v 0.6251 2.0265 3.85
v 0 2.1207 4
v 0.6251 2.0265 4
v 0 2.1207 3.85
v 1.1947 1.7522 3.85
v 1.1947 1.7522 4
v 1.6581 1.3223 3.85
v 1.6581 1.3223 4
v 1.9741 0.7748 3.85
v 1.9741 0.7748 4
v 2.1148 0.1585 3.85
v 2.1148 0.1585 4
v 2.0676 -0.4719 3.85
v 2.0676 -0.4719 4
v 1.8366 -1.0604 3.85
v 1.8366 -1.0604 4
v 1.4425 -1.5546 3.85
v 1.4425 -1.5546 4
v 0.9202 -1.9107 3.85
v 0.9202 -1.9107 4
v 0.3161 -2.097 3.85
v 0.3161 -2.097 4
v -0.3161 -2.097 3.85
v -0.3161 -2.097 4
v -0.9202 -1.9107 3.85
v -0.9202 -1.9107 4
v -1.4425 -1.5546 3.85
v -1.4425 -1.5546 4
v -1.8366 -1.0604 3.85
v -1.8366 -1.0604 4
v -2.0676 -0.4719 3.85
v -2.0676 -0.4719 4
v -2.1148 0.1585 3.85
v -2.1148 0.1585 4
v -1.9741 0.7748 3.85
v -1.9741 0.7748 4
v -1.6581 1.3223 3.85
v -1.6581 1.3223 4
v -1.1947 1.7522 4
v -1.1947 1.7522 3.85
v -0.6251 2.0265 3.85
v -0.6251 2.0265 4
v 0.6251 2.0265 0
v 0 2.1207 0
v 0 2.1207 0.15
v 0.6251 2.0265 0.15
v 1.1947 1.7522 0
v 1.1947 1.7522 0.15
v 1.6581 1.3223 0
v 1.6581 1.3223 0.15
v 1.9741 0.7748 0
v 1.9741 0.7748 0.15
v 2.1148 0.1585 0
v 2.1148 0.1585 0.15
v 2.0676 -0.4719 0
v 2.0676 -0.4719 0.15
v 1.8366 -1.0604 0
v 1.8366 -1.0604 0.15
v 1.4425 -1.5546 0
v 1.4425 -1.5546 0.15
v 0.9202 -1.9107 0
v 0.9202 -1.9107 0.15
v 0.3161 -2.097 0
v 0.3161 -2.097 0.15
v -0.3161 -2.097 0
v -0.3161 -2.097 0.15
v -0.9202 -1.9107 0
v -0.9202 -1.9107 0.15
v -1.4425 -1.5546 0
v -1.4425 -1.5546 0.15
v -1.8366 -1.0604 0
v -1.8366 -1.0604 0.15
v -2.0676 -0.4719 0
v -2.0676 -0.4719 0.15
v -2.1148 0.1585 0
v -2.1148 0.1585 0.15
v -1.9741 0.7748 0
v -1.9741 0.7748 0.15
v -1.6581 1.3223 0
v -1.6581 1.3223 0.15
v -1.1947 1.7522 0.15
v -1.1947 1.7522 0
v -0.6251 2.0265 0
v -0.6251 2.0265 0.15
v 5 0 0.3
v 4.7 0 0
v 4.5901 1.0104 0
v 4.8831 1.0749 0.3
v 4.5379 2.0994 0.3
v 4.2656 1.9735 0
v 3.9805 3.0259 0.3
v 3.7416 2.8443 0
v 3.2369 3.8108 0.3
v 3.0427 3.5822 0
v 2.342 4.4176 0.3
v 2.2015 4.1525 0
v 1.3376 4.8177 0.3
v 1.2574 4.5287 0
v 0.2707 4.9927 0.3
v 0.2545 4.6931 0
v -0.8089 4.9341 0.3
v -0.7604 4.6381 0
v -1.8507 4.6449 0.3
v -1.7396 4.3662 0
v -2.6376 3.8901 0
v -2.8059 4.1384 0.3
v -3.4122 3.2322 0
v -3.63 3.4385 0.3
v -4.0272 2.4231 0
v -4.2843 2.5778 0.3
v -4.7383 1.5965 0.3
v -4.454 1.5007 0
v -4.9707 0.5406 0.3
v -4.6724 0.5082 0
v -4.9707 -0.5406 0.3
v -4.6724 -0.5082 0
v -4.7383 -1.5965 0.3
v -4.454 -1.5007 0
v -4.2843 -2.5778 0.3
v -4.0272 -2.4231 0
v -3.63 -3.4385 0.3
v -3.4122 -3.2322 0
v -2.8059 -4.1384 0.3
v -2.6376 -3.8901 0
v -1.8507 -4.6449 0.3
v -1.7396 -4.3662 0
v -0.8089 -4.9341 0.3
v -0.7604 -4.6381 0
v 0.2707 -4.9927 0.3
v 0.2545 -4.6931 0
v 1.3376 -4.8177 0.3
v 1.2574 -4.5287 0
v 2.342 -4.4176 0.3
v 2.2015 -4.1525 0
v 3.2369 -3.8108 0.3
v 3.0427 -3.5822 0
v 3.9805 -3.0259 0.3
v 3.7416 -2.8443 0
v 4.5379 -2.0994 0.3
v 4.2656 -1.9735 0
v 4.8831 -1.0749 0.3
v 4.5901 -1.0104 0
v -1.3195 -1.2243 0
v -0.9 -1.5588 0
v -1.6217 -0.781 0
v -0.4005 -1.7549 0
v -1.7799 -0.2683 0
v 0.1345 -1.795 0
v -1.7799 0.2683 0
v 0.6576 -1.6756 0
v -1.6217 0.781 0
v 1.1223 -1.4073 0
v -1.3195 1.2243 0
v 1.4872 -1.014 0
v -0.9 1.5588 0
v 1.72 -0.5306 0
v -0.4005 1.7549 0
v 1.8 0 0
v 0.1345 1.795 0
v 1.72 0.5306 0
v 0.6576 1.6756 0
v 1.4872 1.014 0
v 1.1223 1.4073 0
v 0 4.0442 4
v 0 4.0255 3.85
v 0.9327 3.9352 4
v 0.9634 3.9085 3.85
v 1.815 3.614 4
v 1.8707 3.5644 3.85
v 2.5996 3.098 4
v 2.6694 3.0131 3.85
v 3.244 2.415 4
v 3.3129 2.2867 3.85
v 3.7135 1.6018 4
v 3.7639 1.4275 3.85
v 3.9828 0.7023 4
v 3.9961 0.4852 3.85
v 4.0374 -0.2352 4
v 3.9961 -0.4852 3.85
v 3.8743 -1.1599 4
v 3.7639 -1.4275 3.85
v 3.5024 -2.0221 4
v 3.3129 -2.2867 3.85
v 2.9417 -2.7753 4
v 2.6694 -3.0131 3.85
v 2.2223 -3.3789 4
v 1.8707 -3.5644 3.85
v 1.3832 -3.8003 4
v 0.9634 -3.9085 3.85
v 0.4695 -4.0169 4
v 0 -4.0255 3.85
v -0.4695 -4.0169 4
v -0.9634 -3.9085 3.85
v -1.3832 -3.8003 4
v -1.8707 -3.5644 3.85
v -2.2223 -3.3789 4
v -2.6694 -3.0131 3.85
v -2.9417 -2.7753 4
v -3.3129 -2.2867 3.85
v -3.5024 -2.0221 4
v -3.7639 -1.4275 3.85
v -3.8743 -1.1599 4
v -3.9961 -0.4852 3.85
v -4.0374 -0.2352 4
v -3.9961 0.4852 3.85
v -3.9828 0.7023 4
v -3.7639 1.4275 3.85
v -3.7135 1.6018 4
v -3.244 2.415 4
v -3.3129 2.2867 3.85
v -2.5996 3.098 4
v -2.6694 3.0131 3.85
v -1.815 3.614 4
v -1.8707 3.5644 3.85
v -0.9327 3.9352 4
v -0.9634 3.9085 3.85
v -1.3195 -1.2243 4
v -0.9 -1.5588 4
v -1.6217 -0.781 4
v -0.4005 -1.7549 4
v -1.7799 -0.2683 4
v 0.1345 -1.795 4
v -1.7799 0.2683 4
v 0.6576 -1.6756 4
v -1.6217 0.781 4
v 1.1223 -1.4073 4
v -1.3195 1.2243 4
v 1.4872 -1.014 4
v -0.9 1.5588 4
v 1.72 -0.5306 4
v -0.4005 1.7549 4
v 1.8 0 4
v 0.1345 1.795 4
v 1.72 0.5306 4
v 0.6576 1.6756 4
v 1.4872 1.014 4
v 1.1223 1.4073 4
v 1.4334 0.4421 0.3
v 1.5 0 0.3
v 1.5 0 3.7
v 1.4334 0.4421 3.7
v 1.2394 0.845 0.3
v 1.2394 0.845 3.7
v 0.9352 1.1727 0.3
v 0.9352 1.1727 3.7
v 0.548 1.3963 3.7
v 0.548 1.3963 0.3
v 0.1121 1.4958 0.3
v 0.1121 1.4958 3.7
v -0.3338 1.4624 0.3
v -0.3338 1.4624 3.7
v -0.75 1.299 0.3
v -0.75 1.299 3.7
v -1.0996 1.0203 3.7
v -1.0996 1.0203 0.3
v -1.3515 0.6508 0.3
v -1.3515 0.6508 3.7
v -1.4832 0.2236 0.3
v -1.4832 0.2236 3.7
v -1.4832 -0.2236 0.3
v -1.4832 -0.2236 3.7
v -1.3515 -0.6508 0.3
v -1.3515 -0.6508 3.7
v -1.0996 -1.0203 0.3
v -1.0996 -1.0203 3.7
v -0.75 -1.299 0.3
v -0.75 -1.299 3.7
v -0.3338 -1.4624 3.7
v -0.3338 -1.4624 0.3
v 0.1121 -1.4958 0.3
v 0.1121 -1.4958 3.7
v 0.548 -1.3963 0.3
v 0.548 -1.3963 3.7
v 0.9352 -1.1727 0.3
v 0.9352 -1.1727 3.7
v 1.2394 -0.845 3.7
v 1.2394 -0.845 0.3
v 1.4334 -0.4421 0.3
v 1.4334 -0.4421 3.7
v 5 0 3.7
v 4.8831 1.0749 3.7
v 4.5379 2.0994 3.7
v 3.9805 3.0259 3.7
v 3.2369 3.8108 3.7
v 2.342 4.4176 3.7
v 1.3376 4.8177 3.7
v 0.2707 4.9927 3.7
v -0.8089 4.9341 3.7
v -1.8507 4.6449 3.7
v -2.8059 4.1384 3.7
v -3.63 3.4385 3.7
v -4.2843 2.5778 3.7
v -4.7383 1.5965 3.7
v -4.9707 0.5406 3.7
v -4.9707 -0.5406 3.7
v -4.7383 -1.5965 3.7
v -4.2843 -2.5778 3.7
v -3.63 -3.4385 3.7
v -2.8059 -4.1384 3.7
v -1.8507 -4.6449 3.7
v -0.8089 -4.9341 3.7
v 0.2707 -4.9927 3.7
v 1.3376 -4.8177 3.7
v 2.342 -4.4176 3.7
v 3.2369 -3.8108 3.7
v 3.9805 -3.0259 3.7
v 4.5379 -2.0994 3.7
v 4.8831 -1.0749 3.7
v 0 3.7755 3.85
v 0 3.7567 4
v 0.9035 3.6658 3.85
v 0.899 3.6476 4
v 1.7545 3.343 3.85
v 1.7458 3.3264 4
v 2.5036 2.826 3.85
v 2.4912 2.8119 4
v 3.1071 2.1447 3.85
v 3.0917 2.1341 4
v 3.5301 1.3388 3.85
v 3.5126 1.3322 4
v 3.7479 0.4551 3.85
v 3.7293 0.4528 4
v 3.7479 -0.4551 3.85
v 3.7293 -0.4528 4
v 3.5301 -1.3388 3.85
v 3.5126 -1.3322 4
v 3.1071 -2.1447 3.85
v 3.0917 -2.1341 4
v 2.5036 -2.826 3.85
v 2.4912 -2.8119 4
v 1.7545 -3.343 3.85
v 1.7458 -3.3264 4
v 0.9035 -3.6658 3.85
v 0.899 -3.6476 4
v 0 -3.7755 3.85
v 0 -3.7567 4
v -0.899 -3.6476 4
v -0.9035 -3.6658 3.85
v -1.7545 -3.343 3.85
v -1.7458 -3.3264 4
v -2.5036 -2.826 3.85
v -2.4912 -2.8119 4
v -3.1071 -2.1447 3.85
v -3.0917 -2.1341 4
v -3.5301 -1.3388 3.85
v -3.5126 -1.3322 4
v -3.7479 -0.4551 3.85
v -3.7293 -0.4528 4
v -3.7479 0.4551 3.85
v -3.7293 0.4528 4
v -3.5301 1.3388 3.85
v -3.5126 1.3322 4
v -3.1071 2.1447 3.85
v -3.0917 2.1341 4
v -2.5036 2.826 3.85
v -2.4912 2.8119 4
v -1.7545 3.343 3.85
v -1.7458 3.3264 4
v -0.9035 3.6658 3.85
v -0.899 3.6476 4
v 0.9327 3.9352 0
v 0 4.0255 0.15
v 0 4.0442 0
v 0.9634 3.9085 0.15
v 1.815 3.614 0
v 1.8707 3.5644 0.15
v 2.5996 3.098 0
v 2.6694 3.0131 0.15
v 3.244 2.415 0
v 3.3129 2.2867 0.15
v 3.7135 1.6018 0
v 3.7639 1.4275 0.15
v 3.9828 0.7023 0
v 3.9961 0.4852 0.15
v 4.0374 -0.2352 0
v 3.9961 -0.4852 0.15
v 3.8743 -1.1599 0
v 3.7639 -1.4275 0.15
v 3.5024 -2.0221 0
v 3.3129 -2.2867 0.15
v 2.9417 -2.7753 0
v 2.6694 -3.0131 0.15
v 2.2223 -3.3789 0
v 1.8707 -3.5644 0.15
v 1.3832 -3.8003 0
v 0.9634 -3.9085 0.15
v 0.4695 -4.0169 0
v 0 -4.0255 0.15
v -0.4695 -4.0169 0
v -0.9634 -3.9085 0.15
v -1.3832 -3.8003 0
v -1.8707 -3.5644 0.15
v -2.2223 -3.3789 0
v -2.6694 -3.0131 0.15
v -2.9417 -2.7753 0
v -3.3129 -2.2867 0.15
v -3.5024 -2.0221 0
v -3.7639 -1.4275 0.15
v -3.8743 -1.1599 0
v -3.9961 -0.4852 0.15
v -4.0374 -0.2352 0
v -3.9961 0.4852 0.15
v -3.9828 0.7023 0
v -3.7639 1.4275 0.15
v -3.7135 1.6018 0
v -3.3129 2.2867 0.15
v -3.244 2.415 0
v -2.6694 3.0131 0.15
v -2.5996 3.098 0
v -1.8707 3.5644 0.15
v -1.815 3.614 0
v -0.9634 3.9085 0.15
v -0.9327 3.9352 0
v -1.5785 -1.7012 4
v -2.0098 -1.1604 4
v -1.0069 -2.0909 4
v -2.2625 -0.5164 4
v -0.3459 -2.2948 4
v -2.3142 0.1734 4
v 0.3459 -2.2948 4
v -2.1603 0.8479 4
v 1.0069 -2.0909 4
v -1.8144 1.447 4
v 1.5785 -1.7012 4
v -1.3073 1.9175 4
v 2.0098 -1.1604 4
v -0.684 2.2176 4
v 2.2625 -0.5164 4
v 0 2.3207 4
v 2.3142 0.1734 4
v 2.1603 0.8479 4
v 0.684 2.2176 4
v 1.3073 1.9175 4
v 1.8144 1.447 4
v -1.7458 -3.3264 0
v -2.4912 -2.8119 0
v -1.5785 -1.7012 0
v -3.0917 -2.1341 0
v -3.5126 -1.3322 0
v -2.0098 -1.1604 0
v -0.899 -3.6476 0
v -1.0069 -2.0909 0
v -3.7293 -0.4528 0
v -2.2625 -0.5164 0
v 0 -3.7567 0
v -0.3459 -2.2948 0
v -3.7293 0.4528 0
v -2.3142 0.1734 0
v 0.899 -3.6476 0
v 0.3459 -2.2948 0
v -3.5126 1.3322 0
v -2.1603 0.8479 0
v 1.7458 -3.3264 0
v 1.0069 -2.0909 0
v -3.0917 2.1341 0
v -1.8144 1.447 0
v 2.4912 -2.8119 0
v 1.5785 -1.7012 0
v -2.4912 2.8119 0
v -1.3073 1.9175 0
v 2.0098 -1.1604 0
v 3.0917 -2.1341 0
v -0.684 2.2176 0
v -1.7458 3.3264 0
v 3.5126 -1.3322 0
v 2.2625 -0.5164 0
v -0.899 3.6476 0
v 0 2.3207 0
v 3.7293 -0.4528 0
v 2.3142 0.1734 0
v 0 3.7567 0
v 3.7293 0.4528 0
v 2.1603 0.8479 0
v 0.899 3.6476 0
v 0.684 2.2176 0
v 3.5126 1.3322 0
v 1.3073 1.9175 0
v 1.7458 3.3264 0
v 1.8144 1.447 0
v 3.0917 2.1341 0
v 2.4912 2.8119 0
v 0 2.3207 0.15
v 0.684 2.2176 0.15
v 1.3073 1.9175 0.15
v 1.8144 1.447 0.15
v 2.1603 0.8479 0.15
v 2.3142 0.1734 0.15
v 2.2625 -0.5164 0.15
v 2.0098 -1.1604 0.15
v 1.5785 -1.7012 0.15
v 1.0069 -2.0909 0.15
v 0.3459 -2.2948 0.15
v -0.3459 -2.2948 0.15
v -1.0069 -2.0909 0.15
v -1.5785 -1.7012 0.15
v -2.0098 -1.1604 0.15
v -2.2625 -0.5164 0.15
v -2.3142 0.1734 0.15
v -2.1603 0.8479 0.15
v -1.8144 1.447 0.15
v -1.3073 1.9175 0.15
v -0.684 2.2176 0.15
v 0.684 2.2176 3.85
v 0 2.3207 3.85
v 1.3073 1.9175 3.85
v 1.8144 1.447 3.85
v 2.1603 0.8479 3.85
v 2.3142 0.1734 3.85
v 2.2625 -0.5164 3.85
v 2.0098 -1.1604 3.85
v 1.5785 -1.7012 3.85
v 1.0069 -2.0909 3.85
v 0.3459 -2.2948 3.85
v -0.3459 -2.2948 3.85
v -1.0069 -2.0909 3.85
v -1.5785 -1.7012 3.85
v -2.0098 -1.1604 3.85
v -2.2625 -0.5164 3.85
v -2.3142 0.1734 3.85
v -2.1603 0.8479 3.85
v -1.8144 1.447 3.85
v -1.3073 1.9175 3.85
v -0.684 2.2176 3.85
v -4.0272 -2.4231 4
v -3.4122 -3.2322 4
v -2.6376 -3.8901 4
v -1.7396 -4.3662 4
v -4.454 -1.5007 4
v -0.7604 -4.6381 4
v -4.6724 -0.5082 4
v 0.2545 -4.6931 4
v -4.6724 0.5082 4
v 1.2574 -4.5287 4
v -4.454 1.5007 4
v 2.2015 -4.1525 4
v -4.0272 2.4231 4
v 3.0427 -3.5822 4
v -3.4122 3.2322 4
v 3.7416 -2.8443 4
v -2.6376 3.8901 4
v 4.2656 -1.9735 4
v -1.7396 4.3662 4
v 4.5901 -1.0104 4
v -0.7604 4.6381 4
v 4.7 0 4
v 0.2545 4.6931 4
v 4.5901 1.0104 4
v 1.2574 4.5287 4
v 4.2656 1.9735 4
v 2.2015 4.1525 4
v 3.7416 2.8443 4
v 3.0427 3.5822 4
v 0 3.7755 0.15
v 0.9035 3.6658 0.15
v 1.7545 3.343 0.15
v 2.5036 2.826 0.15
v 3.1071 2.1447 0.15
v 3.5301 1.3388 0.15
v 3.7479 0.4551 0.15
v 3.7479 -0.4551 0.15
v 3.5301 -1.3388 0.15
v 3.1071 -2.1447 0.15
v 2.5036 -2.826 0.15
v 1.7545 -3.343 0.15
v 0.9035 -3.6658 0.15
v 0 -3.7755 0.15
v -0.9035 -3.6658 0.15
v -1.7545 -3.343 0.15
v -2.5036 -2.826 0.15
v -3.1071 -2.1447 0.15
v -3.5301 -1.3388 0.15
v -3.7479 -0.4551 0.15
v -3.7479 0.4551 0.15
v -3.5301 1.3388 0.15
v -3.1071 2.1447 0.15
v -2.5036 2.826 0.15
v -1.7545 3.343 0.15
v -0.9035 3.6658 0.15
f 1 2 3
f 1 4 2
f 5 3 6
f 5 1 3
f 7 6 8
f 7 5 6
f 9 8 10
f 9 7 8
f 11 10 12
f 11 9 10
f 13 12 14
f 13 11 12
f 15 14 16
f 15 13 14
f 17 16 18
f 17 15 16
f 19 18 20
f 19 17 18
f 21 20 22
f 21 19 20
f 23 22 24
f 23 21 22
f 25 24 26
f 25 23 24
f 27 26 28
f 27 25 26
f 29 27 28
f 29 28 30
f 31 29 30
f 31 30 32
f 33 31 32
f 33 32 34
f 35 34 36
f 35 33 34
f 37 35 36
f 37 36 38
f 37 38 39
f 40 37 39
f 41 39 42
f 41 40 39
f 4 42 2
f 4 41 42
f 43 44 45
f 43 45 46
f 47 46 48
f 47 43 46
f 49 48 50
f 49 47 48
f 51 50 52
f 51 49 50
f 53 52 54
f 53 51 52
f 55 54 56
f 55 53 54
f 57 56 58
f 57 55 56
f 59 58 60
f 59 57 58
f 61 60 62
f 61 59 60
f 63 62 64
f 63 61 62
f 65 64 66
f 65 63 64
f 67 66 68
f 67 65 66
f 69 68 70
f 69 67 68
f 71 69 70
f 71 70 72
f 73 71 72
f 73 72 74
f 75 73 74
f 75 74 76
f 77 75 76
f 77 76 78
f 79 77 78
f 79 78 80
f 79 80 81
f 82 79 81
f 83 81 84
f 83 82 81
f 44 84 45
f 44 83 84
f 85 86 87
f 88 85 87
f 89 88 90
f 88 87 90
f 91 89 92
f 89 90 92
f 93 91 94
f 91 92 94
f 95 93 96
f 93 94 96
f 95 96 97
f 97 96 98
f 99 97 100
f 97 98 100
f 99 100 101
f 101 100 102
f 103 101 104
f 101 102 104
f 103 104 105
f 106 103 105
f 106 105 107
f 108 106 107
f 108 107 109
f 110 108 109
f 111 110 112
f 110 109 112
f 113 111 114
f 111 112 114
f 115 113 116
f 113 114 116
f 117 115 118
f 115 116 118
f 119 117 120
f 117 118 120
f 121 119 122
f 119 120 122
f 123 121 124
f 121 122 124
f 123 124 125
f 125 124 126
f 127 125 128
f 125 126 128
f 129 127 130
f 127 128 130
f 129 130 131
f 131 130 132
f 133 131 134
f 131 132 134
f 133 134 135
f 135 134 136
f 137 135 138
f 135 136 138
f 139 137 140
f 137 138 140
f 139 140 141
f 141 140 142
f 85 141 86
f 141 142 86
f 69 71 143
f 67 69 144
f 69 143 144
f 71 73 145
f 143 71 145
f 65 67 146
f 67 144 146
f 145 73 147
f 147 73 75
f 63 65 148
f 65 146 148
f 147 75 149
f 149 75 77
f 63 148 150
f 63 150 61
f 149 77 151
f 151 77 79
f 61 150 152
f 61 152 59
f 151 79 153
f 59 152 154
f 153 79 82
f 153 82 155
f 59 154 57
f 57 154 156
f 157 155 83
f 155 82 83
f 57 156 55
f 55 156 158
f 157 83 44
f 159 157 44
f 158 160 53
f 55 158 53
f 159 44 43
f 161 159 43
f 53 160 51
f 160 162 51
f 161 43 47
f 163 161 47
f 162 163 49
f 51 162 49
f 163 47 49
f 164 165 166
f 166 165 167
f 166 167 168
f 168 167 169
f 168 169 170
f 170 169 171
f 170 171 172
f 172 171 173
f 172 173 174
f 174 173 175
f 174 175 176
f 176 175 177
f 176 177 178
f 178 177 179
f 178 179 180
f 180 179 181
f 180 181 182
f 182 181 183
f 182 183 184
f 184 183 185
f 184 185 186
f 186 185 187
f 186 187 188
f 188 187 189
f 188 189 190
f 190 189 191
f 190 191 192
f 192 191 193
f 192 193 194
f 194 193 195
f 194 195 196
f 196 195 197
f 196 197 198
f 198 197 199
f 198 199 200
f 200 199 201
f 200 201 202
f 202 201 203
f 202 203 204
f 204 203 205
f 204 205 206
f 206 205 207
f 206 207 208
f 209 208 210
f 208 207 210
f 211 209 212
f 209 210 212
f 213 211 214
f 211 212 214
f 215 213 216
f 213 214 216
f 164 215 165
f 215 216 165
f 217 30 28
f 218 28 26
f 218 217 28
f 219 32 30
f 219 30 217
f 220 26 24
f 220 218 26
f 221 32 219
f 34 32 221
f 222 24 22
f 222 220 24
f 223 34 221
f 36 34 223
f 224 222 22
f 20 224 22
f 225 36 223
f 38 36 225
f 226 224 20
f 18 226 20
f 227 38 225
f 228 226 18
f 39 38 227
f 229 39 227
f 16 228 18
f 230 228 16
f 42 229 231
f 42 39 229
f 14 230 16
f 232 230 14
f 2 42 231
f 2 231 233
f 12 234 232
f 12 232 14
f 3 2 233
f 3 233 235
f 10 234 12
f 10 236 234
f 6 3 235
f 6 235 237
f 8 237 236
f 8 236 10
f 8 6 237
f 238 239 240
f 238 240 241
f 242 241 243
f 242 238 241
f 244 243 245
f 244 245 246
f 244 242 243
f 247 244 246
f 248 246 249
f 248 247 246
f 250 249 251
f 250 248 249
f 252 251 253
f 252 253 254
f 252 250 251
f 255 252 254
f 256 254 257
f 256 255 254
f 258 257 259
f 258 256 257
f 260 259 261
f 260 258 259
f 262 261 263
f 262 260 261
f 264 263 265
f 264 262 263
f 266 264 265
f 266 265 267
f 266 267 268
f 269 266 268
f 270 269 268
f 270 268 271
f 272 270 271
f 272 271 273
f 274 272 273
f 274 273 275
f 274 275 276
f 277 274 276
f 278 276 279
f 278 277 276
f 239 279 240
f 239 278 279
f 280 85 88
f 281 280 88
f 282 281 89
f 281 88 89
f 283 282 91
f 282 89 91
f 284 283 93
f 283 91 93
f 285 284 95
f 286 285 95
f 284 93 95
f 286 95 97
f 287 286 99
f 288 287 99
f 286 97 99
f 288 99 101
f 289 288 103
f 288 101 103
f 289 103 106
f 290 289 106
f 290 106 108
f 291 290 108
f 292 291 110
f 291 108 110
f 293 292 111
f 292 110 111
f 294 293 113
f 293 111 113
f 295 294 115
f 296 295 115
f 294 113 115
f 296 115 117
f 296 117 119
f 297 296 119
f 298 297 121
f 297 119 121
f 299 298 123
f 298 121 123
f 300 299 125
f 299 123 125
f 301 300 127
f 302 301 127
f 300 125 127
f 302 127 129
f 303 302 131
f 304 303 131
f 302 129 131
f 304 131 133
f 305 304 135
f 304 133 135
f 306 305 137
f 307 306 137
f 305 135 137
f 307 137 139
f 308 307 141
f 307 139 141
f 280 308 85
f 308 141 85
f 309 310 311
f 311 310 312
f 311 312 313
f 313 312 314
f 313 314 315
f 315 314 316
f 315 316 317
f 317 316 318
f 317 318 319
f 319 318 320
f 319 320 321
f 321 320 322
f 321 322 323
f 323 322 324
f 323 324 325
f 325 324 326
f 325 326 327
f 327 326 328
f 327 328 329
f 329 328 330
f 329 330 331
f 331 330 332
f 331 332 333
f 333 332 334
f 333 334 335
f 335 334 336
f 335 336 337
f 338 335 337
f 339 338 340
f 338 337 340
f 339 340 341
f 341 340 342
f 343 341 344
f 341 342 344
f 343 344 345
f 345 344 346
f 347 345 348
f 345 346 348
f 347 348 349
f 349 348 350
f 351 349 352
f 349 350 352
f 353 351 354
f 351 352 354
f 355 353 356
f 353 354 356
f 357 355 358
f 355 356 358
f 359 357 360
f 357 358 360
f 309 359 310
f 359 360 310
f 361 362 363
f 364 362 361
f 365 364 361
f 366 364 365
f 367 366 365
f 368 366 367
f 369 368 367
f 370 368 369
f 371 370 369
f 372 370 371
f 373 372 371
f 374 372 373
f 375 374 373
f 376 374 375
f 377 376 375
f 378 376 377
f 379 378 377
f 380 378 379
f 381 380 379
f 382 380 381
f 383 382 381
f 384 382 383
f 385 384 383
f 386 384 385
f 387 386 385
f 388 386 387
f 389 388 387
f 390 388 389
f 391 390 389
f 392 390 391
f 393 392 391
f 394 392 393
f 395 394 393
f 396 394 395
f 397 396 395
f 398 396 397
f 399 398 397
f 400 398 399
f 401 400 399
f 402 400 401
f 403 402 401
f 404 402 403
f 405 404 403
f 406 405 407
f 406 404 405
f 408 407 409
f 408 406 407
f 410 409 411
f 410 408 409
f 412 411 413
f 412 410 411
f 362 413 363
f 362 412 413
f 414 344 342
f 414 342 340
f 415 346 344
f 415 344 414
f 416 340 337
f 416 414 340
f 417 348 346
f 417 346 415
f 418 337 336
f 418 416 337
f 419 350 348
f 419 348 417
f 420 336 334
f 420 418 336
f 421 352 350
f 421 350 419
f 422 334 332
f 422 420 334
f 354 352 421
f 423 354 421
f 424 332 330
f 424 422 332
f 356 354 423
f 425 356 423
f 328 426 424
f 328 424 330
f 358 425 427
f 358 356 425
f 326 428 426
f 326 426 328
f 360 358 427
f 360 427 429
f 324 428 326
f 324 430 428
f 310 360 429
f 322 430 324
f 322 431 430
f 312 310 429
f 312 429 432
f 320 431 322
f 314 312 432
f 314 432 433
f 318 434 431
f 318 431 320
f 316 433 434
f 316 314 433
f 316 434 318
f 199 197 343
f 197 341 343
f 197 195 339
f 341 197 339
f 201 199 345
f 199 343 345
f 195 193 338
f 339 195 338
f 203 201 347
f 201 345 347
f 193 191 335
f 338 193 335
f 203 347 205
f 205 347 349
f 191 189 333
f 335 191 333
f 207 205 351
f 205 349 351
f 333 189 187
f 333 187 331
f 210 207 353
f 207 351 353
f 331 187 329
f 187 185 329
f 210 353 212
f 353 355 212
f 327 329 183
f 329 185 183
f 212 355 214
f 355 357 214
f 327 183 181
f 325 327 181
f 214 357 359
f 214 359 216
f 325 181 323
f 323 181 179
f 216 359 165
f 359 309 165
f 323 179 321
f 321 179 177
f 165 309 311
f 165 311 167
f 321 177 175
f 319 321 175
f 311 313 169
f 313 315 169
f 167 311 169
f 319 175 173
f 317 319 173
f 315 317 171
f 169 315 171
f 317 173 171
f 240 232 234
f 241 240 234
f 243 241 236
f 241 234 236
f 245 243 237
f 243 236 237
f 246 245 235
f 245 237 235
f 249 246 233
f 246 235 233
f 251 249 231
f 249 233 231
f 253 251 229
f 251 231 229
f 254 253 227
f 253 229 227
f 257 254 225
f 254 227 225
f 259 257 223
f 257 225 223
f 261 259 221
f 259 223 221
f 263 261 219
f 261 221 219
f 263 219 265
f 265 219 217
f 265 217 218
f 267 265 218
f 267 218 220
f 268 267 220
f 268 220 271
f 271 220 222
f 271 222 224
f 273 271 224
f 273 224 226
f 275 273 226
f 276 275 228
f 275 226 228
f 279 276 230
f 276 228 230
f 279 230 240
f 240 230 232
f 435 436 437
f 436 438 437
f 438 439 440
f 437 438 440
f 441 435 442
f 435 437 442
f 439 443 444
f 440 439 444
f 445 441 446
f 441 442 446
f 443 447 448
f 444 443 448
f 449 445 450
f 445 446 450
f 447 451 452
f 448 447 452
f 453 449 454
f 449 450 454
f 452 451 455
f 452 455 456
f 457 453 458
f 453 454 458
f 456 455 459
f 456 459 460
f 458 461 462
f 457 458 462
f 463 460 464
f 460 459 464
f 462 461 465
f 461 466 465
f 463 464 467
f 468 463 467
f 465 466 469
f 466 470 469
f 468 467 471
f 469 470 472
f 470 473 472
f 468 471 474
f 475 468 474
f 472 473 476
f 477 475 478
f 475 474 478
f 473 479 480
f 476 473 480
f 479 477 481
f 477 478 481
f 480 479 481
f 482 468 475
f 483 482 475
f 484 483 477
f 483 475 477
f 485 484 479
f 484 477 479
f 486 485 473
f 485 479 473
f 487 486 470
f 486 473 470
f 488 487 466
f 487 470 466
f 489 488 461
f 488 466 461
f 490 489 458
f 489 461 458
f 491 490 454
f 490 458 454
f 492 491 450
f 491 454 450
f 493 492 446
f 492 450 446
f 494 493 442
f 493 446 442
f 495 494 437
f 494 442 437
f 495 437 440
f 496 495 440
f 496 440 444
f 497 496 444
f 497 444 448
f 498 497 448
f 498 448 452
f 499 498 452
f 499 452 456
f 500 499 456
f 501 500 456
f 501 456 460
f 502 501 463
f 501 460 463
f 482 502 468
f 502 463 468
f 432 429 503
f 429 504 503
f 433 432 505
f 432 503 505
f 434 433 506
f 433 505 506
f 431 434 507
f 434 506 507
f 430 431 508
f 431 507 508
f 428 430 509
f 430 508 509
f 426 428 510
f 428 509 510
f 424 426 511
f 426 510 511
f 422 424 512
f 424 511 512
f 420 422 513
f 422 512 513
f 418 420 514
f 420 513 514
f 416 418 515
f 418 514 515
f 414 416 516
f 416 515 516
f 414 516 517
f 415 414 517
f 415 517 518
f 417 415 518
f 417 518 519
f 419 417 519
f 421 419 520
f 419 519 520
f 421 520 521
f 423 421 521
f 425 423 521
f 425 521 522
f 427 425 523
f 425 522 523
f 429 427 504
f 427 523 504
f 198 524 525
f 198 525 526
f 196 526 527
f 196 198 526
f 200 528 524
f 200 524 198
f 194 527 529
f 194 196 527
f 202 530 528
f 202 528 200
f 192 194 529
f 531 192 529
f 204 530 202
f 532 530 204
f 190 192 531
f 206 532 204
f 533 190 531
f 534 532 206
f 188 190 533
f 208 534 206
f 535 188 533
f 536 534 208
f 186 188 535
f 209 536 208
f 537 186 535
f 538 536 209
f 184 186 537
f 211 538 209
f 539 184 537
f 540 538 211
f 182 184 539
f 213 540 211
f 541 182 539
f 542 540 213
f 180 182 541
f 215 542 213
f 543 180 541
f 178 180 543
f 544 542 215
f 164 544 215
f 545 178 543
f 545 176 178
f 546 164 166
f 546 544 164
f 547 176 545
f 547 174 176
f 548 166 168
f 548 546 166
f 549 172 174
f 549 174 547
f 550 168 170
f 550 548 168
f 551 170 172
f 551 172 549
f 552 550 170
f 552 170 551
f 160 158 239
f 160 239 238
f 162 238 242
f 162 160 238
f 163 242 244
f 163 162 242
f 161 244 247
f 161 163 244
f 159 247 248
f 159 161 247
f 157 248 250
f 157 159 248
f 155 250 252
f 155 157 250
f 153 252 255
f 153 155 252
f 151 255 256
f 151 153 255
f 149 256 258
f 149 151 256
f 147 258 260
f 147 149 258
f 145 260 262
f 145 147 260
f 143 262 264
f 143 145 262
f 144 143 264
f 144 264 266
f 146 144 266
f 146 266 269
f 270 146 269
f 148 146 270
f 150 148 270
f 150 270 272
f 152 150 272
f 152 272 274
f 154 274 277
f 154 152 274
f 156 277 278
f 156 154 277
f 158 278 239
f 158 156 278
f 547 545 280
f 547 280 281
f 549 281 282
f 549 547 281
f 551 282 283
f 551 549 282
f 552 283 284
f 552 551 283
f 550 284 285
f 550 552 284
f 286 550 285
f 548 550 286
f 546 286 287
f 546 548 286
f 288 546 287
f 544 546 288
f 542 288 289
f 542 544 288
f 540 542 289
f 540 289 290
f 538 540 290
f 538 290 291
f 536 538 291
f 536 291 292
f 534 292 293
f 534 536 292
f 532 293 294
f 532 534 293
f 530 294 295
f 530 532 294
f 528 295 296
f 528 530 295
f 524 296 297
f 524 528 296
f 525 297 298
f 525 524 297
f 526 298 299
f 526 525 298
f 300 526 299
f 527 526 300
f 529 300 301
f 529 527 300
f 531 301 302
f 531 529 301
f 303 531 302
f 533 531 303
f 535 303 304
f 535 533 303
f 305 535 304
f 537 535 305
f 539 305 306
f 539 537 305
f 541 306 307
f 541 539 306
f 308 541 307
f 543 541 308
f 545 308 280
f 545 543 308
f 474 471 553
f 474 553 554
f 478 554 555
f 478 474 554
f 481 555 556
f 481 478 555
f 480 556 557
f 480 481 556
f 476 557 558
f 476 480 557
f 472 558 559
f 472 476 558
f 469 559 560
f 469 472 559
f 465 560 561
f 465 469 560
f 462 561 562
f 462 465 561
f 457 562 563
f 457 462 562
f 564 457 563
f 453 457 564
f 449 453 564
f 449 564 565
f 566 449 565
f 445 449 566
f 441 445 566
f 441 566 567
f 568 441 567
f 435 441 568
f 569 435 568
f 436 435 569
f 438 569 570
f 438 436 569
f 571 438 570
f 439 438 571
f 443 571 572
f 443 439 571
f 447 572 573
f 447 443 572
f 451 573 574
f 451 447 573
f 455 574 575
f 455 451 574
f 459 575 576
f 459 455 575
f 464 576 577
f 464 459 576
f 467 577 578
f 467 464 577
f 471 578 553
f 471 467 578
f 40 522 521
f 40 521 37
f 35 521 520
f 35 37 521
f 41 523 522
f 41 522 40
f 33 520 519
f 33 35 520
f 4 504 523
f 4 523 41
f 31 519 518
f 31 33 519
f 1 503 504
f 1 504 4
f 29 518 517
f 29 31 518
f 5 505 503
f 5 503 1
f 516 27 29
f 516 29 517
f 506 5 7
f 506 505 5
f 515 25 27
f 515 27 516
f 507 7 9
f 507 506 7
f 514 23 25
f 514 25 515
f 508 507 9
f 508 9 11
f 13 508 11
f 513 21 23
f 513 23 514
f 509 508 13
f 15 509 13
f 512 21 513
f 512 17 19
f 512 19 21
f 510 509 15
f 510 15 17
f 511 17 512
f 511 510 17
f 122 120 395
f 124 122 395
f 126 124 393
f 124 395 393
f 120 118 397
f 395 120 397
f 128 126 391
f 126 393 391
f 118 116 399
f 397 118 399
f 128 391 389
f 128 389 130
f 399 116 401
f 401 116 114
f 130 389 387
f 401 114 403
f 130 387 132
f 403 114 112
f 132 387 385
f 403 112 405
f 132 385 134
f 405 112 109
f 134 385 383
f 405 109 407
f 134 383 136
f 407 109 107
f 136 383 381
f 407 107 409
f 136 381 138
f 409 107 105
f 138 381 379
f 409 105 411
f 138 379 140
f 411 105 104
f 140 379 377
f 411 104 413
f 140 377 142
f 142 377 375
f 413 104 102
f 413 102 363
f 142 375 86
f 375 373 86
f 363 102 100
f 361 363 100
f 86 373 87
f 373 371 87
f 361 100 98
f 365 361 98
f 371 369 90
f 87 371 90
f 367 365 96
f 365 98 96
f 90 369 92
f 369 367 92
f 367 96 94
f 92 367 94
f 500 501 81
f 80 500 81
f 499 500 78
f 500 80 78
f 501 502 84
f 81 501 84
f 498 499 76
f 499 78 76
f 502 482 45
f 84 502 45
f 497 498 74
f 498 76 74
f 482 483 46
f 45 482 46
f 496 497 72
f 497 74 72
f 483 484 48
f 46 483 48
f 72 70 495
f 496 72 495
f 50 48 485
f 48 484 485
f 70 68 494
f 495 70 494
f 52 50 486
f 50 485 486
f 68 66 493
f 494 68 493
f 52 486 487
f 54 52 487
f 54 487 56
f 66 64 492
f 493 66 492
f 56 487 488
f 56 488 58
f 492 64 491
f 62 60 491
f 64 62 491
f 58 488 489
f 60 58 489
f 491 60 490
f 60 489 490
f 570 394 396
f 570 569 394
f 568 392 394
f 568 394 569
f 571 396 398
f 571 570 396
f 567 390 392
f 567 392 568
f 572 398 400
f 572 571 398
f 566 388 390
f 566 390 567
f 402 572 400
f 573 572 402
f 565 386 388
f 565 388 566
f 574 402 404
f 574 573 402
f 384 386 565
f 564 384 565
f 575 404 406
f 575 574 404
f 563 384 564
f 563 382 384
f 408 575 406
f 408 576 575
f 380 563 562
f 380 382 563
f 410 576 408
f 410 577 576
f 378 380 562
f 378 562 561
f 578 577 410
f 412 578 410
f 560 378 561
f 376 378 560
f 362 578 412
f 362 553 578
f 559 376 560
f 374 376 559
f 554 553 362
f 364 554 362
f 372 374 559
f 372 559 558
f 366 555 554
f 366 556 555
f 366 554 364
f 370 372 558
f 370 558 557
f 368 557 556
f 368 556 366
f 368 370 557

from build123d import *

# Parameters (mm, degrees)
CROQUIS1_R              = 5
CROQUIS1_R_2            = 1.5
SALIENTE_EXTRUIR1_DEPTH = 4
CHAFL_N1_SIZE           = 0.3
CROQUIS2_W              = 1
CROQUIS2_H              = 0.2


with BuildPart() as part:
    # Croquis1 → Saliente-Extruir1 (new body)
    with BuildSketch(Plane.XY):
        Circle(CROQUIS1_R)
        Circle(CROQUIS1_R_2, mode=Mode.SUBTRACT)
    extrude(amount=SALIENTE_EXTRUIR1_DEPTH)

    # Chaflán1
    chafl_n1_edges = [part.edges().sort_by_distance(p)[0] for p in [
        (-5, 0, 0),
        (-5, 0, 4),
        (-1.5, 0, 0),
        (-1.5, 0, 4),
    ]]
    chamfer(chafl_n1_edges, length=CHAFL_N1_SIZE)

    # Croquis2 → Cortar-Revolución1 (revolve, cut)
    with BuildSketch(Plane(origin=(0, 0, 0), x_dir=(0, 0, -1), z_dir=(1, 0, 0))):
        Polygon((-4.85, 4.150466692), (-3.85, 4.025466692), (-3.85, 3.775466692), (-4.85, 3.650466692), align=None)
        Polygon((0.85, 3.650466692), (0.85, 4.150466692), (-0.15, 4.025466692), (-0.15, 3.775466692), align=None)
        with Locations((-4.35, 2.220733596)):
            Rectangle(CROQUIS2_W, CROQUIS2_H)
        with Locations((0.35, 2.220733596)):
            Rectangle(CROQUIS2_W, CROQUIS2_H)
    revolve(axis=Axis((0, 0, 12.411349243), (0, 0, -1)), mode=Mode.SUBTRACT)


solid = part.part
